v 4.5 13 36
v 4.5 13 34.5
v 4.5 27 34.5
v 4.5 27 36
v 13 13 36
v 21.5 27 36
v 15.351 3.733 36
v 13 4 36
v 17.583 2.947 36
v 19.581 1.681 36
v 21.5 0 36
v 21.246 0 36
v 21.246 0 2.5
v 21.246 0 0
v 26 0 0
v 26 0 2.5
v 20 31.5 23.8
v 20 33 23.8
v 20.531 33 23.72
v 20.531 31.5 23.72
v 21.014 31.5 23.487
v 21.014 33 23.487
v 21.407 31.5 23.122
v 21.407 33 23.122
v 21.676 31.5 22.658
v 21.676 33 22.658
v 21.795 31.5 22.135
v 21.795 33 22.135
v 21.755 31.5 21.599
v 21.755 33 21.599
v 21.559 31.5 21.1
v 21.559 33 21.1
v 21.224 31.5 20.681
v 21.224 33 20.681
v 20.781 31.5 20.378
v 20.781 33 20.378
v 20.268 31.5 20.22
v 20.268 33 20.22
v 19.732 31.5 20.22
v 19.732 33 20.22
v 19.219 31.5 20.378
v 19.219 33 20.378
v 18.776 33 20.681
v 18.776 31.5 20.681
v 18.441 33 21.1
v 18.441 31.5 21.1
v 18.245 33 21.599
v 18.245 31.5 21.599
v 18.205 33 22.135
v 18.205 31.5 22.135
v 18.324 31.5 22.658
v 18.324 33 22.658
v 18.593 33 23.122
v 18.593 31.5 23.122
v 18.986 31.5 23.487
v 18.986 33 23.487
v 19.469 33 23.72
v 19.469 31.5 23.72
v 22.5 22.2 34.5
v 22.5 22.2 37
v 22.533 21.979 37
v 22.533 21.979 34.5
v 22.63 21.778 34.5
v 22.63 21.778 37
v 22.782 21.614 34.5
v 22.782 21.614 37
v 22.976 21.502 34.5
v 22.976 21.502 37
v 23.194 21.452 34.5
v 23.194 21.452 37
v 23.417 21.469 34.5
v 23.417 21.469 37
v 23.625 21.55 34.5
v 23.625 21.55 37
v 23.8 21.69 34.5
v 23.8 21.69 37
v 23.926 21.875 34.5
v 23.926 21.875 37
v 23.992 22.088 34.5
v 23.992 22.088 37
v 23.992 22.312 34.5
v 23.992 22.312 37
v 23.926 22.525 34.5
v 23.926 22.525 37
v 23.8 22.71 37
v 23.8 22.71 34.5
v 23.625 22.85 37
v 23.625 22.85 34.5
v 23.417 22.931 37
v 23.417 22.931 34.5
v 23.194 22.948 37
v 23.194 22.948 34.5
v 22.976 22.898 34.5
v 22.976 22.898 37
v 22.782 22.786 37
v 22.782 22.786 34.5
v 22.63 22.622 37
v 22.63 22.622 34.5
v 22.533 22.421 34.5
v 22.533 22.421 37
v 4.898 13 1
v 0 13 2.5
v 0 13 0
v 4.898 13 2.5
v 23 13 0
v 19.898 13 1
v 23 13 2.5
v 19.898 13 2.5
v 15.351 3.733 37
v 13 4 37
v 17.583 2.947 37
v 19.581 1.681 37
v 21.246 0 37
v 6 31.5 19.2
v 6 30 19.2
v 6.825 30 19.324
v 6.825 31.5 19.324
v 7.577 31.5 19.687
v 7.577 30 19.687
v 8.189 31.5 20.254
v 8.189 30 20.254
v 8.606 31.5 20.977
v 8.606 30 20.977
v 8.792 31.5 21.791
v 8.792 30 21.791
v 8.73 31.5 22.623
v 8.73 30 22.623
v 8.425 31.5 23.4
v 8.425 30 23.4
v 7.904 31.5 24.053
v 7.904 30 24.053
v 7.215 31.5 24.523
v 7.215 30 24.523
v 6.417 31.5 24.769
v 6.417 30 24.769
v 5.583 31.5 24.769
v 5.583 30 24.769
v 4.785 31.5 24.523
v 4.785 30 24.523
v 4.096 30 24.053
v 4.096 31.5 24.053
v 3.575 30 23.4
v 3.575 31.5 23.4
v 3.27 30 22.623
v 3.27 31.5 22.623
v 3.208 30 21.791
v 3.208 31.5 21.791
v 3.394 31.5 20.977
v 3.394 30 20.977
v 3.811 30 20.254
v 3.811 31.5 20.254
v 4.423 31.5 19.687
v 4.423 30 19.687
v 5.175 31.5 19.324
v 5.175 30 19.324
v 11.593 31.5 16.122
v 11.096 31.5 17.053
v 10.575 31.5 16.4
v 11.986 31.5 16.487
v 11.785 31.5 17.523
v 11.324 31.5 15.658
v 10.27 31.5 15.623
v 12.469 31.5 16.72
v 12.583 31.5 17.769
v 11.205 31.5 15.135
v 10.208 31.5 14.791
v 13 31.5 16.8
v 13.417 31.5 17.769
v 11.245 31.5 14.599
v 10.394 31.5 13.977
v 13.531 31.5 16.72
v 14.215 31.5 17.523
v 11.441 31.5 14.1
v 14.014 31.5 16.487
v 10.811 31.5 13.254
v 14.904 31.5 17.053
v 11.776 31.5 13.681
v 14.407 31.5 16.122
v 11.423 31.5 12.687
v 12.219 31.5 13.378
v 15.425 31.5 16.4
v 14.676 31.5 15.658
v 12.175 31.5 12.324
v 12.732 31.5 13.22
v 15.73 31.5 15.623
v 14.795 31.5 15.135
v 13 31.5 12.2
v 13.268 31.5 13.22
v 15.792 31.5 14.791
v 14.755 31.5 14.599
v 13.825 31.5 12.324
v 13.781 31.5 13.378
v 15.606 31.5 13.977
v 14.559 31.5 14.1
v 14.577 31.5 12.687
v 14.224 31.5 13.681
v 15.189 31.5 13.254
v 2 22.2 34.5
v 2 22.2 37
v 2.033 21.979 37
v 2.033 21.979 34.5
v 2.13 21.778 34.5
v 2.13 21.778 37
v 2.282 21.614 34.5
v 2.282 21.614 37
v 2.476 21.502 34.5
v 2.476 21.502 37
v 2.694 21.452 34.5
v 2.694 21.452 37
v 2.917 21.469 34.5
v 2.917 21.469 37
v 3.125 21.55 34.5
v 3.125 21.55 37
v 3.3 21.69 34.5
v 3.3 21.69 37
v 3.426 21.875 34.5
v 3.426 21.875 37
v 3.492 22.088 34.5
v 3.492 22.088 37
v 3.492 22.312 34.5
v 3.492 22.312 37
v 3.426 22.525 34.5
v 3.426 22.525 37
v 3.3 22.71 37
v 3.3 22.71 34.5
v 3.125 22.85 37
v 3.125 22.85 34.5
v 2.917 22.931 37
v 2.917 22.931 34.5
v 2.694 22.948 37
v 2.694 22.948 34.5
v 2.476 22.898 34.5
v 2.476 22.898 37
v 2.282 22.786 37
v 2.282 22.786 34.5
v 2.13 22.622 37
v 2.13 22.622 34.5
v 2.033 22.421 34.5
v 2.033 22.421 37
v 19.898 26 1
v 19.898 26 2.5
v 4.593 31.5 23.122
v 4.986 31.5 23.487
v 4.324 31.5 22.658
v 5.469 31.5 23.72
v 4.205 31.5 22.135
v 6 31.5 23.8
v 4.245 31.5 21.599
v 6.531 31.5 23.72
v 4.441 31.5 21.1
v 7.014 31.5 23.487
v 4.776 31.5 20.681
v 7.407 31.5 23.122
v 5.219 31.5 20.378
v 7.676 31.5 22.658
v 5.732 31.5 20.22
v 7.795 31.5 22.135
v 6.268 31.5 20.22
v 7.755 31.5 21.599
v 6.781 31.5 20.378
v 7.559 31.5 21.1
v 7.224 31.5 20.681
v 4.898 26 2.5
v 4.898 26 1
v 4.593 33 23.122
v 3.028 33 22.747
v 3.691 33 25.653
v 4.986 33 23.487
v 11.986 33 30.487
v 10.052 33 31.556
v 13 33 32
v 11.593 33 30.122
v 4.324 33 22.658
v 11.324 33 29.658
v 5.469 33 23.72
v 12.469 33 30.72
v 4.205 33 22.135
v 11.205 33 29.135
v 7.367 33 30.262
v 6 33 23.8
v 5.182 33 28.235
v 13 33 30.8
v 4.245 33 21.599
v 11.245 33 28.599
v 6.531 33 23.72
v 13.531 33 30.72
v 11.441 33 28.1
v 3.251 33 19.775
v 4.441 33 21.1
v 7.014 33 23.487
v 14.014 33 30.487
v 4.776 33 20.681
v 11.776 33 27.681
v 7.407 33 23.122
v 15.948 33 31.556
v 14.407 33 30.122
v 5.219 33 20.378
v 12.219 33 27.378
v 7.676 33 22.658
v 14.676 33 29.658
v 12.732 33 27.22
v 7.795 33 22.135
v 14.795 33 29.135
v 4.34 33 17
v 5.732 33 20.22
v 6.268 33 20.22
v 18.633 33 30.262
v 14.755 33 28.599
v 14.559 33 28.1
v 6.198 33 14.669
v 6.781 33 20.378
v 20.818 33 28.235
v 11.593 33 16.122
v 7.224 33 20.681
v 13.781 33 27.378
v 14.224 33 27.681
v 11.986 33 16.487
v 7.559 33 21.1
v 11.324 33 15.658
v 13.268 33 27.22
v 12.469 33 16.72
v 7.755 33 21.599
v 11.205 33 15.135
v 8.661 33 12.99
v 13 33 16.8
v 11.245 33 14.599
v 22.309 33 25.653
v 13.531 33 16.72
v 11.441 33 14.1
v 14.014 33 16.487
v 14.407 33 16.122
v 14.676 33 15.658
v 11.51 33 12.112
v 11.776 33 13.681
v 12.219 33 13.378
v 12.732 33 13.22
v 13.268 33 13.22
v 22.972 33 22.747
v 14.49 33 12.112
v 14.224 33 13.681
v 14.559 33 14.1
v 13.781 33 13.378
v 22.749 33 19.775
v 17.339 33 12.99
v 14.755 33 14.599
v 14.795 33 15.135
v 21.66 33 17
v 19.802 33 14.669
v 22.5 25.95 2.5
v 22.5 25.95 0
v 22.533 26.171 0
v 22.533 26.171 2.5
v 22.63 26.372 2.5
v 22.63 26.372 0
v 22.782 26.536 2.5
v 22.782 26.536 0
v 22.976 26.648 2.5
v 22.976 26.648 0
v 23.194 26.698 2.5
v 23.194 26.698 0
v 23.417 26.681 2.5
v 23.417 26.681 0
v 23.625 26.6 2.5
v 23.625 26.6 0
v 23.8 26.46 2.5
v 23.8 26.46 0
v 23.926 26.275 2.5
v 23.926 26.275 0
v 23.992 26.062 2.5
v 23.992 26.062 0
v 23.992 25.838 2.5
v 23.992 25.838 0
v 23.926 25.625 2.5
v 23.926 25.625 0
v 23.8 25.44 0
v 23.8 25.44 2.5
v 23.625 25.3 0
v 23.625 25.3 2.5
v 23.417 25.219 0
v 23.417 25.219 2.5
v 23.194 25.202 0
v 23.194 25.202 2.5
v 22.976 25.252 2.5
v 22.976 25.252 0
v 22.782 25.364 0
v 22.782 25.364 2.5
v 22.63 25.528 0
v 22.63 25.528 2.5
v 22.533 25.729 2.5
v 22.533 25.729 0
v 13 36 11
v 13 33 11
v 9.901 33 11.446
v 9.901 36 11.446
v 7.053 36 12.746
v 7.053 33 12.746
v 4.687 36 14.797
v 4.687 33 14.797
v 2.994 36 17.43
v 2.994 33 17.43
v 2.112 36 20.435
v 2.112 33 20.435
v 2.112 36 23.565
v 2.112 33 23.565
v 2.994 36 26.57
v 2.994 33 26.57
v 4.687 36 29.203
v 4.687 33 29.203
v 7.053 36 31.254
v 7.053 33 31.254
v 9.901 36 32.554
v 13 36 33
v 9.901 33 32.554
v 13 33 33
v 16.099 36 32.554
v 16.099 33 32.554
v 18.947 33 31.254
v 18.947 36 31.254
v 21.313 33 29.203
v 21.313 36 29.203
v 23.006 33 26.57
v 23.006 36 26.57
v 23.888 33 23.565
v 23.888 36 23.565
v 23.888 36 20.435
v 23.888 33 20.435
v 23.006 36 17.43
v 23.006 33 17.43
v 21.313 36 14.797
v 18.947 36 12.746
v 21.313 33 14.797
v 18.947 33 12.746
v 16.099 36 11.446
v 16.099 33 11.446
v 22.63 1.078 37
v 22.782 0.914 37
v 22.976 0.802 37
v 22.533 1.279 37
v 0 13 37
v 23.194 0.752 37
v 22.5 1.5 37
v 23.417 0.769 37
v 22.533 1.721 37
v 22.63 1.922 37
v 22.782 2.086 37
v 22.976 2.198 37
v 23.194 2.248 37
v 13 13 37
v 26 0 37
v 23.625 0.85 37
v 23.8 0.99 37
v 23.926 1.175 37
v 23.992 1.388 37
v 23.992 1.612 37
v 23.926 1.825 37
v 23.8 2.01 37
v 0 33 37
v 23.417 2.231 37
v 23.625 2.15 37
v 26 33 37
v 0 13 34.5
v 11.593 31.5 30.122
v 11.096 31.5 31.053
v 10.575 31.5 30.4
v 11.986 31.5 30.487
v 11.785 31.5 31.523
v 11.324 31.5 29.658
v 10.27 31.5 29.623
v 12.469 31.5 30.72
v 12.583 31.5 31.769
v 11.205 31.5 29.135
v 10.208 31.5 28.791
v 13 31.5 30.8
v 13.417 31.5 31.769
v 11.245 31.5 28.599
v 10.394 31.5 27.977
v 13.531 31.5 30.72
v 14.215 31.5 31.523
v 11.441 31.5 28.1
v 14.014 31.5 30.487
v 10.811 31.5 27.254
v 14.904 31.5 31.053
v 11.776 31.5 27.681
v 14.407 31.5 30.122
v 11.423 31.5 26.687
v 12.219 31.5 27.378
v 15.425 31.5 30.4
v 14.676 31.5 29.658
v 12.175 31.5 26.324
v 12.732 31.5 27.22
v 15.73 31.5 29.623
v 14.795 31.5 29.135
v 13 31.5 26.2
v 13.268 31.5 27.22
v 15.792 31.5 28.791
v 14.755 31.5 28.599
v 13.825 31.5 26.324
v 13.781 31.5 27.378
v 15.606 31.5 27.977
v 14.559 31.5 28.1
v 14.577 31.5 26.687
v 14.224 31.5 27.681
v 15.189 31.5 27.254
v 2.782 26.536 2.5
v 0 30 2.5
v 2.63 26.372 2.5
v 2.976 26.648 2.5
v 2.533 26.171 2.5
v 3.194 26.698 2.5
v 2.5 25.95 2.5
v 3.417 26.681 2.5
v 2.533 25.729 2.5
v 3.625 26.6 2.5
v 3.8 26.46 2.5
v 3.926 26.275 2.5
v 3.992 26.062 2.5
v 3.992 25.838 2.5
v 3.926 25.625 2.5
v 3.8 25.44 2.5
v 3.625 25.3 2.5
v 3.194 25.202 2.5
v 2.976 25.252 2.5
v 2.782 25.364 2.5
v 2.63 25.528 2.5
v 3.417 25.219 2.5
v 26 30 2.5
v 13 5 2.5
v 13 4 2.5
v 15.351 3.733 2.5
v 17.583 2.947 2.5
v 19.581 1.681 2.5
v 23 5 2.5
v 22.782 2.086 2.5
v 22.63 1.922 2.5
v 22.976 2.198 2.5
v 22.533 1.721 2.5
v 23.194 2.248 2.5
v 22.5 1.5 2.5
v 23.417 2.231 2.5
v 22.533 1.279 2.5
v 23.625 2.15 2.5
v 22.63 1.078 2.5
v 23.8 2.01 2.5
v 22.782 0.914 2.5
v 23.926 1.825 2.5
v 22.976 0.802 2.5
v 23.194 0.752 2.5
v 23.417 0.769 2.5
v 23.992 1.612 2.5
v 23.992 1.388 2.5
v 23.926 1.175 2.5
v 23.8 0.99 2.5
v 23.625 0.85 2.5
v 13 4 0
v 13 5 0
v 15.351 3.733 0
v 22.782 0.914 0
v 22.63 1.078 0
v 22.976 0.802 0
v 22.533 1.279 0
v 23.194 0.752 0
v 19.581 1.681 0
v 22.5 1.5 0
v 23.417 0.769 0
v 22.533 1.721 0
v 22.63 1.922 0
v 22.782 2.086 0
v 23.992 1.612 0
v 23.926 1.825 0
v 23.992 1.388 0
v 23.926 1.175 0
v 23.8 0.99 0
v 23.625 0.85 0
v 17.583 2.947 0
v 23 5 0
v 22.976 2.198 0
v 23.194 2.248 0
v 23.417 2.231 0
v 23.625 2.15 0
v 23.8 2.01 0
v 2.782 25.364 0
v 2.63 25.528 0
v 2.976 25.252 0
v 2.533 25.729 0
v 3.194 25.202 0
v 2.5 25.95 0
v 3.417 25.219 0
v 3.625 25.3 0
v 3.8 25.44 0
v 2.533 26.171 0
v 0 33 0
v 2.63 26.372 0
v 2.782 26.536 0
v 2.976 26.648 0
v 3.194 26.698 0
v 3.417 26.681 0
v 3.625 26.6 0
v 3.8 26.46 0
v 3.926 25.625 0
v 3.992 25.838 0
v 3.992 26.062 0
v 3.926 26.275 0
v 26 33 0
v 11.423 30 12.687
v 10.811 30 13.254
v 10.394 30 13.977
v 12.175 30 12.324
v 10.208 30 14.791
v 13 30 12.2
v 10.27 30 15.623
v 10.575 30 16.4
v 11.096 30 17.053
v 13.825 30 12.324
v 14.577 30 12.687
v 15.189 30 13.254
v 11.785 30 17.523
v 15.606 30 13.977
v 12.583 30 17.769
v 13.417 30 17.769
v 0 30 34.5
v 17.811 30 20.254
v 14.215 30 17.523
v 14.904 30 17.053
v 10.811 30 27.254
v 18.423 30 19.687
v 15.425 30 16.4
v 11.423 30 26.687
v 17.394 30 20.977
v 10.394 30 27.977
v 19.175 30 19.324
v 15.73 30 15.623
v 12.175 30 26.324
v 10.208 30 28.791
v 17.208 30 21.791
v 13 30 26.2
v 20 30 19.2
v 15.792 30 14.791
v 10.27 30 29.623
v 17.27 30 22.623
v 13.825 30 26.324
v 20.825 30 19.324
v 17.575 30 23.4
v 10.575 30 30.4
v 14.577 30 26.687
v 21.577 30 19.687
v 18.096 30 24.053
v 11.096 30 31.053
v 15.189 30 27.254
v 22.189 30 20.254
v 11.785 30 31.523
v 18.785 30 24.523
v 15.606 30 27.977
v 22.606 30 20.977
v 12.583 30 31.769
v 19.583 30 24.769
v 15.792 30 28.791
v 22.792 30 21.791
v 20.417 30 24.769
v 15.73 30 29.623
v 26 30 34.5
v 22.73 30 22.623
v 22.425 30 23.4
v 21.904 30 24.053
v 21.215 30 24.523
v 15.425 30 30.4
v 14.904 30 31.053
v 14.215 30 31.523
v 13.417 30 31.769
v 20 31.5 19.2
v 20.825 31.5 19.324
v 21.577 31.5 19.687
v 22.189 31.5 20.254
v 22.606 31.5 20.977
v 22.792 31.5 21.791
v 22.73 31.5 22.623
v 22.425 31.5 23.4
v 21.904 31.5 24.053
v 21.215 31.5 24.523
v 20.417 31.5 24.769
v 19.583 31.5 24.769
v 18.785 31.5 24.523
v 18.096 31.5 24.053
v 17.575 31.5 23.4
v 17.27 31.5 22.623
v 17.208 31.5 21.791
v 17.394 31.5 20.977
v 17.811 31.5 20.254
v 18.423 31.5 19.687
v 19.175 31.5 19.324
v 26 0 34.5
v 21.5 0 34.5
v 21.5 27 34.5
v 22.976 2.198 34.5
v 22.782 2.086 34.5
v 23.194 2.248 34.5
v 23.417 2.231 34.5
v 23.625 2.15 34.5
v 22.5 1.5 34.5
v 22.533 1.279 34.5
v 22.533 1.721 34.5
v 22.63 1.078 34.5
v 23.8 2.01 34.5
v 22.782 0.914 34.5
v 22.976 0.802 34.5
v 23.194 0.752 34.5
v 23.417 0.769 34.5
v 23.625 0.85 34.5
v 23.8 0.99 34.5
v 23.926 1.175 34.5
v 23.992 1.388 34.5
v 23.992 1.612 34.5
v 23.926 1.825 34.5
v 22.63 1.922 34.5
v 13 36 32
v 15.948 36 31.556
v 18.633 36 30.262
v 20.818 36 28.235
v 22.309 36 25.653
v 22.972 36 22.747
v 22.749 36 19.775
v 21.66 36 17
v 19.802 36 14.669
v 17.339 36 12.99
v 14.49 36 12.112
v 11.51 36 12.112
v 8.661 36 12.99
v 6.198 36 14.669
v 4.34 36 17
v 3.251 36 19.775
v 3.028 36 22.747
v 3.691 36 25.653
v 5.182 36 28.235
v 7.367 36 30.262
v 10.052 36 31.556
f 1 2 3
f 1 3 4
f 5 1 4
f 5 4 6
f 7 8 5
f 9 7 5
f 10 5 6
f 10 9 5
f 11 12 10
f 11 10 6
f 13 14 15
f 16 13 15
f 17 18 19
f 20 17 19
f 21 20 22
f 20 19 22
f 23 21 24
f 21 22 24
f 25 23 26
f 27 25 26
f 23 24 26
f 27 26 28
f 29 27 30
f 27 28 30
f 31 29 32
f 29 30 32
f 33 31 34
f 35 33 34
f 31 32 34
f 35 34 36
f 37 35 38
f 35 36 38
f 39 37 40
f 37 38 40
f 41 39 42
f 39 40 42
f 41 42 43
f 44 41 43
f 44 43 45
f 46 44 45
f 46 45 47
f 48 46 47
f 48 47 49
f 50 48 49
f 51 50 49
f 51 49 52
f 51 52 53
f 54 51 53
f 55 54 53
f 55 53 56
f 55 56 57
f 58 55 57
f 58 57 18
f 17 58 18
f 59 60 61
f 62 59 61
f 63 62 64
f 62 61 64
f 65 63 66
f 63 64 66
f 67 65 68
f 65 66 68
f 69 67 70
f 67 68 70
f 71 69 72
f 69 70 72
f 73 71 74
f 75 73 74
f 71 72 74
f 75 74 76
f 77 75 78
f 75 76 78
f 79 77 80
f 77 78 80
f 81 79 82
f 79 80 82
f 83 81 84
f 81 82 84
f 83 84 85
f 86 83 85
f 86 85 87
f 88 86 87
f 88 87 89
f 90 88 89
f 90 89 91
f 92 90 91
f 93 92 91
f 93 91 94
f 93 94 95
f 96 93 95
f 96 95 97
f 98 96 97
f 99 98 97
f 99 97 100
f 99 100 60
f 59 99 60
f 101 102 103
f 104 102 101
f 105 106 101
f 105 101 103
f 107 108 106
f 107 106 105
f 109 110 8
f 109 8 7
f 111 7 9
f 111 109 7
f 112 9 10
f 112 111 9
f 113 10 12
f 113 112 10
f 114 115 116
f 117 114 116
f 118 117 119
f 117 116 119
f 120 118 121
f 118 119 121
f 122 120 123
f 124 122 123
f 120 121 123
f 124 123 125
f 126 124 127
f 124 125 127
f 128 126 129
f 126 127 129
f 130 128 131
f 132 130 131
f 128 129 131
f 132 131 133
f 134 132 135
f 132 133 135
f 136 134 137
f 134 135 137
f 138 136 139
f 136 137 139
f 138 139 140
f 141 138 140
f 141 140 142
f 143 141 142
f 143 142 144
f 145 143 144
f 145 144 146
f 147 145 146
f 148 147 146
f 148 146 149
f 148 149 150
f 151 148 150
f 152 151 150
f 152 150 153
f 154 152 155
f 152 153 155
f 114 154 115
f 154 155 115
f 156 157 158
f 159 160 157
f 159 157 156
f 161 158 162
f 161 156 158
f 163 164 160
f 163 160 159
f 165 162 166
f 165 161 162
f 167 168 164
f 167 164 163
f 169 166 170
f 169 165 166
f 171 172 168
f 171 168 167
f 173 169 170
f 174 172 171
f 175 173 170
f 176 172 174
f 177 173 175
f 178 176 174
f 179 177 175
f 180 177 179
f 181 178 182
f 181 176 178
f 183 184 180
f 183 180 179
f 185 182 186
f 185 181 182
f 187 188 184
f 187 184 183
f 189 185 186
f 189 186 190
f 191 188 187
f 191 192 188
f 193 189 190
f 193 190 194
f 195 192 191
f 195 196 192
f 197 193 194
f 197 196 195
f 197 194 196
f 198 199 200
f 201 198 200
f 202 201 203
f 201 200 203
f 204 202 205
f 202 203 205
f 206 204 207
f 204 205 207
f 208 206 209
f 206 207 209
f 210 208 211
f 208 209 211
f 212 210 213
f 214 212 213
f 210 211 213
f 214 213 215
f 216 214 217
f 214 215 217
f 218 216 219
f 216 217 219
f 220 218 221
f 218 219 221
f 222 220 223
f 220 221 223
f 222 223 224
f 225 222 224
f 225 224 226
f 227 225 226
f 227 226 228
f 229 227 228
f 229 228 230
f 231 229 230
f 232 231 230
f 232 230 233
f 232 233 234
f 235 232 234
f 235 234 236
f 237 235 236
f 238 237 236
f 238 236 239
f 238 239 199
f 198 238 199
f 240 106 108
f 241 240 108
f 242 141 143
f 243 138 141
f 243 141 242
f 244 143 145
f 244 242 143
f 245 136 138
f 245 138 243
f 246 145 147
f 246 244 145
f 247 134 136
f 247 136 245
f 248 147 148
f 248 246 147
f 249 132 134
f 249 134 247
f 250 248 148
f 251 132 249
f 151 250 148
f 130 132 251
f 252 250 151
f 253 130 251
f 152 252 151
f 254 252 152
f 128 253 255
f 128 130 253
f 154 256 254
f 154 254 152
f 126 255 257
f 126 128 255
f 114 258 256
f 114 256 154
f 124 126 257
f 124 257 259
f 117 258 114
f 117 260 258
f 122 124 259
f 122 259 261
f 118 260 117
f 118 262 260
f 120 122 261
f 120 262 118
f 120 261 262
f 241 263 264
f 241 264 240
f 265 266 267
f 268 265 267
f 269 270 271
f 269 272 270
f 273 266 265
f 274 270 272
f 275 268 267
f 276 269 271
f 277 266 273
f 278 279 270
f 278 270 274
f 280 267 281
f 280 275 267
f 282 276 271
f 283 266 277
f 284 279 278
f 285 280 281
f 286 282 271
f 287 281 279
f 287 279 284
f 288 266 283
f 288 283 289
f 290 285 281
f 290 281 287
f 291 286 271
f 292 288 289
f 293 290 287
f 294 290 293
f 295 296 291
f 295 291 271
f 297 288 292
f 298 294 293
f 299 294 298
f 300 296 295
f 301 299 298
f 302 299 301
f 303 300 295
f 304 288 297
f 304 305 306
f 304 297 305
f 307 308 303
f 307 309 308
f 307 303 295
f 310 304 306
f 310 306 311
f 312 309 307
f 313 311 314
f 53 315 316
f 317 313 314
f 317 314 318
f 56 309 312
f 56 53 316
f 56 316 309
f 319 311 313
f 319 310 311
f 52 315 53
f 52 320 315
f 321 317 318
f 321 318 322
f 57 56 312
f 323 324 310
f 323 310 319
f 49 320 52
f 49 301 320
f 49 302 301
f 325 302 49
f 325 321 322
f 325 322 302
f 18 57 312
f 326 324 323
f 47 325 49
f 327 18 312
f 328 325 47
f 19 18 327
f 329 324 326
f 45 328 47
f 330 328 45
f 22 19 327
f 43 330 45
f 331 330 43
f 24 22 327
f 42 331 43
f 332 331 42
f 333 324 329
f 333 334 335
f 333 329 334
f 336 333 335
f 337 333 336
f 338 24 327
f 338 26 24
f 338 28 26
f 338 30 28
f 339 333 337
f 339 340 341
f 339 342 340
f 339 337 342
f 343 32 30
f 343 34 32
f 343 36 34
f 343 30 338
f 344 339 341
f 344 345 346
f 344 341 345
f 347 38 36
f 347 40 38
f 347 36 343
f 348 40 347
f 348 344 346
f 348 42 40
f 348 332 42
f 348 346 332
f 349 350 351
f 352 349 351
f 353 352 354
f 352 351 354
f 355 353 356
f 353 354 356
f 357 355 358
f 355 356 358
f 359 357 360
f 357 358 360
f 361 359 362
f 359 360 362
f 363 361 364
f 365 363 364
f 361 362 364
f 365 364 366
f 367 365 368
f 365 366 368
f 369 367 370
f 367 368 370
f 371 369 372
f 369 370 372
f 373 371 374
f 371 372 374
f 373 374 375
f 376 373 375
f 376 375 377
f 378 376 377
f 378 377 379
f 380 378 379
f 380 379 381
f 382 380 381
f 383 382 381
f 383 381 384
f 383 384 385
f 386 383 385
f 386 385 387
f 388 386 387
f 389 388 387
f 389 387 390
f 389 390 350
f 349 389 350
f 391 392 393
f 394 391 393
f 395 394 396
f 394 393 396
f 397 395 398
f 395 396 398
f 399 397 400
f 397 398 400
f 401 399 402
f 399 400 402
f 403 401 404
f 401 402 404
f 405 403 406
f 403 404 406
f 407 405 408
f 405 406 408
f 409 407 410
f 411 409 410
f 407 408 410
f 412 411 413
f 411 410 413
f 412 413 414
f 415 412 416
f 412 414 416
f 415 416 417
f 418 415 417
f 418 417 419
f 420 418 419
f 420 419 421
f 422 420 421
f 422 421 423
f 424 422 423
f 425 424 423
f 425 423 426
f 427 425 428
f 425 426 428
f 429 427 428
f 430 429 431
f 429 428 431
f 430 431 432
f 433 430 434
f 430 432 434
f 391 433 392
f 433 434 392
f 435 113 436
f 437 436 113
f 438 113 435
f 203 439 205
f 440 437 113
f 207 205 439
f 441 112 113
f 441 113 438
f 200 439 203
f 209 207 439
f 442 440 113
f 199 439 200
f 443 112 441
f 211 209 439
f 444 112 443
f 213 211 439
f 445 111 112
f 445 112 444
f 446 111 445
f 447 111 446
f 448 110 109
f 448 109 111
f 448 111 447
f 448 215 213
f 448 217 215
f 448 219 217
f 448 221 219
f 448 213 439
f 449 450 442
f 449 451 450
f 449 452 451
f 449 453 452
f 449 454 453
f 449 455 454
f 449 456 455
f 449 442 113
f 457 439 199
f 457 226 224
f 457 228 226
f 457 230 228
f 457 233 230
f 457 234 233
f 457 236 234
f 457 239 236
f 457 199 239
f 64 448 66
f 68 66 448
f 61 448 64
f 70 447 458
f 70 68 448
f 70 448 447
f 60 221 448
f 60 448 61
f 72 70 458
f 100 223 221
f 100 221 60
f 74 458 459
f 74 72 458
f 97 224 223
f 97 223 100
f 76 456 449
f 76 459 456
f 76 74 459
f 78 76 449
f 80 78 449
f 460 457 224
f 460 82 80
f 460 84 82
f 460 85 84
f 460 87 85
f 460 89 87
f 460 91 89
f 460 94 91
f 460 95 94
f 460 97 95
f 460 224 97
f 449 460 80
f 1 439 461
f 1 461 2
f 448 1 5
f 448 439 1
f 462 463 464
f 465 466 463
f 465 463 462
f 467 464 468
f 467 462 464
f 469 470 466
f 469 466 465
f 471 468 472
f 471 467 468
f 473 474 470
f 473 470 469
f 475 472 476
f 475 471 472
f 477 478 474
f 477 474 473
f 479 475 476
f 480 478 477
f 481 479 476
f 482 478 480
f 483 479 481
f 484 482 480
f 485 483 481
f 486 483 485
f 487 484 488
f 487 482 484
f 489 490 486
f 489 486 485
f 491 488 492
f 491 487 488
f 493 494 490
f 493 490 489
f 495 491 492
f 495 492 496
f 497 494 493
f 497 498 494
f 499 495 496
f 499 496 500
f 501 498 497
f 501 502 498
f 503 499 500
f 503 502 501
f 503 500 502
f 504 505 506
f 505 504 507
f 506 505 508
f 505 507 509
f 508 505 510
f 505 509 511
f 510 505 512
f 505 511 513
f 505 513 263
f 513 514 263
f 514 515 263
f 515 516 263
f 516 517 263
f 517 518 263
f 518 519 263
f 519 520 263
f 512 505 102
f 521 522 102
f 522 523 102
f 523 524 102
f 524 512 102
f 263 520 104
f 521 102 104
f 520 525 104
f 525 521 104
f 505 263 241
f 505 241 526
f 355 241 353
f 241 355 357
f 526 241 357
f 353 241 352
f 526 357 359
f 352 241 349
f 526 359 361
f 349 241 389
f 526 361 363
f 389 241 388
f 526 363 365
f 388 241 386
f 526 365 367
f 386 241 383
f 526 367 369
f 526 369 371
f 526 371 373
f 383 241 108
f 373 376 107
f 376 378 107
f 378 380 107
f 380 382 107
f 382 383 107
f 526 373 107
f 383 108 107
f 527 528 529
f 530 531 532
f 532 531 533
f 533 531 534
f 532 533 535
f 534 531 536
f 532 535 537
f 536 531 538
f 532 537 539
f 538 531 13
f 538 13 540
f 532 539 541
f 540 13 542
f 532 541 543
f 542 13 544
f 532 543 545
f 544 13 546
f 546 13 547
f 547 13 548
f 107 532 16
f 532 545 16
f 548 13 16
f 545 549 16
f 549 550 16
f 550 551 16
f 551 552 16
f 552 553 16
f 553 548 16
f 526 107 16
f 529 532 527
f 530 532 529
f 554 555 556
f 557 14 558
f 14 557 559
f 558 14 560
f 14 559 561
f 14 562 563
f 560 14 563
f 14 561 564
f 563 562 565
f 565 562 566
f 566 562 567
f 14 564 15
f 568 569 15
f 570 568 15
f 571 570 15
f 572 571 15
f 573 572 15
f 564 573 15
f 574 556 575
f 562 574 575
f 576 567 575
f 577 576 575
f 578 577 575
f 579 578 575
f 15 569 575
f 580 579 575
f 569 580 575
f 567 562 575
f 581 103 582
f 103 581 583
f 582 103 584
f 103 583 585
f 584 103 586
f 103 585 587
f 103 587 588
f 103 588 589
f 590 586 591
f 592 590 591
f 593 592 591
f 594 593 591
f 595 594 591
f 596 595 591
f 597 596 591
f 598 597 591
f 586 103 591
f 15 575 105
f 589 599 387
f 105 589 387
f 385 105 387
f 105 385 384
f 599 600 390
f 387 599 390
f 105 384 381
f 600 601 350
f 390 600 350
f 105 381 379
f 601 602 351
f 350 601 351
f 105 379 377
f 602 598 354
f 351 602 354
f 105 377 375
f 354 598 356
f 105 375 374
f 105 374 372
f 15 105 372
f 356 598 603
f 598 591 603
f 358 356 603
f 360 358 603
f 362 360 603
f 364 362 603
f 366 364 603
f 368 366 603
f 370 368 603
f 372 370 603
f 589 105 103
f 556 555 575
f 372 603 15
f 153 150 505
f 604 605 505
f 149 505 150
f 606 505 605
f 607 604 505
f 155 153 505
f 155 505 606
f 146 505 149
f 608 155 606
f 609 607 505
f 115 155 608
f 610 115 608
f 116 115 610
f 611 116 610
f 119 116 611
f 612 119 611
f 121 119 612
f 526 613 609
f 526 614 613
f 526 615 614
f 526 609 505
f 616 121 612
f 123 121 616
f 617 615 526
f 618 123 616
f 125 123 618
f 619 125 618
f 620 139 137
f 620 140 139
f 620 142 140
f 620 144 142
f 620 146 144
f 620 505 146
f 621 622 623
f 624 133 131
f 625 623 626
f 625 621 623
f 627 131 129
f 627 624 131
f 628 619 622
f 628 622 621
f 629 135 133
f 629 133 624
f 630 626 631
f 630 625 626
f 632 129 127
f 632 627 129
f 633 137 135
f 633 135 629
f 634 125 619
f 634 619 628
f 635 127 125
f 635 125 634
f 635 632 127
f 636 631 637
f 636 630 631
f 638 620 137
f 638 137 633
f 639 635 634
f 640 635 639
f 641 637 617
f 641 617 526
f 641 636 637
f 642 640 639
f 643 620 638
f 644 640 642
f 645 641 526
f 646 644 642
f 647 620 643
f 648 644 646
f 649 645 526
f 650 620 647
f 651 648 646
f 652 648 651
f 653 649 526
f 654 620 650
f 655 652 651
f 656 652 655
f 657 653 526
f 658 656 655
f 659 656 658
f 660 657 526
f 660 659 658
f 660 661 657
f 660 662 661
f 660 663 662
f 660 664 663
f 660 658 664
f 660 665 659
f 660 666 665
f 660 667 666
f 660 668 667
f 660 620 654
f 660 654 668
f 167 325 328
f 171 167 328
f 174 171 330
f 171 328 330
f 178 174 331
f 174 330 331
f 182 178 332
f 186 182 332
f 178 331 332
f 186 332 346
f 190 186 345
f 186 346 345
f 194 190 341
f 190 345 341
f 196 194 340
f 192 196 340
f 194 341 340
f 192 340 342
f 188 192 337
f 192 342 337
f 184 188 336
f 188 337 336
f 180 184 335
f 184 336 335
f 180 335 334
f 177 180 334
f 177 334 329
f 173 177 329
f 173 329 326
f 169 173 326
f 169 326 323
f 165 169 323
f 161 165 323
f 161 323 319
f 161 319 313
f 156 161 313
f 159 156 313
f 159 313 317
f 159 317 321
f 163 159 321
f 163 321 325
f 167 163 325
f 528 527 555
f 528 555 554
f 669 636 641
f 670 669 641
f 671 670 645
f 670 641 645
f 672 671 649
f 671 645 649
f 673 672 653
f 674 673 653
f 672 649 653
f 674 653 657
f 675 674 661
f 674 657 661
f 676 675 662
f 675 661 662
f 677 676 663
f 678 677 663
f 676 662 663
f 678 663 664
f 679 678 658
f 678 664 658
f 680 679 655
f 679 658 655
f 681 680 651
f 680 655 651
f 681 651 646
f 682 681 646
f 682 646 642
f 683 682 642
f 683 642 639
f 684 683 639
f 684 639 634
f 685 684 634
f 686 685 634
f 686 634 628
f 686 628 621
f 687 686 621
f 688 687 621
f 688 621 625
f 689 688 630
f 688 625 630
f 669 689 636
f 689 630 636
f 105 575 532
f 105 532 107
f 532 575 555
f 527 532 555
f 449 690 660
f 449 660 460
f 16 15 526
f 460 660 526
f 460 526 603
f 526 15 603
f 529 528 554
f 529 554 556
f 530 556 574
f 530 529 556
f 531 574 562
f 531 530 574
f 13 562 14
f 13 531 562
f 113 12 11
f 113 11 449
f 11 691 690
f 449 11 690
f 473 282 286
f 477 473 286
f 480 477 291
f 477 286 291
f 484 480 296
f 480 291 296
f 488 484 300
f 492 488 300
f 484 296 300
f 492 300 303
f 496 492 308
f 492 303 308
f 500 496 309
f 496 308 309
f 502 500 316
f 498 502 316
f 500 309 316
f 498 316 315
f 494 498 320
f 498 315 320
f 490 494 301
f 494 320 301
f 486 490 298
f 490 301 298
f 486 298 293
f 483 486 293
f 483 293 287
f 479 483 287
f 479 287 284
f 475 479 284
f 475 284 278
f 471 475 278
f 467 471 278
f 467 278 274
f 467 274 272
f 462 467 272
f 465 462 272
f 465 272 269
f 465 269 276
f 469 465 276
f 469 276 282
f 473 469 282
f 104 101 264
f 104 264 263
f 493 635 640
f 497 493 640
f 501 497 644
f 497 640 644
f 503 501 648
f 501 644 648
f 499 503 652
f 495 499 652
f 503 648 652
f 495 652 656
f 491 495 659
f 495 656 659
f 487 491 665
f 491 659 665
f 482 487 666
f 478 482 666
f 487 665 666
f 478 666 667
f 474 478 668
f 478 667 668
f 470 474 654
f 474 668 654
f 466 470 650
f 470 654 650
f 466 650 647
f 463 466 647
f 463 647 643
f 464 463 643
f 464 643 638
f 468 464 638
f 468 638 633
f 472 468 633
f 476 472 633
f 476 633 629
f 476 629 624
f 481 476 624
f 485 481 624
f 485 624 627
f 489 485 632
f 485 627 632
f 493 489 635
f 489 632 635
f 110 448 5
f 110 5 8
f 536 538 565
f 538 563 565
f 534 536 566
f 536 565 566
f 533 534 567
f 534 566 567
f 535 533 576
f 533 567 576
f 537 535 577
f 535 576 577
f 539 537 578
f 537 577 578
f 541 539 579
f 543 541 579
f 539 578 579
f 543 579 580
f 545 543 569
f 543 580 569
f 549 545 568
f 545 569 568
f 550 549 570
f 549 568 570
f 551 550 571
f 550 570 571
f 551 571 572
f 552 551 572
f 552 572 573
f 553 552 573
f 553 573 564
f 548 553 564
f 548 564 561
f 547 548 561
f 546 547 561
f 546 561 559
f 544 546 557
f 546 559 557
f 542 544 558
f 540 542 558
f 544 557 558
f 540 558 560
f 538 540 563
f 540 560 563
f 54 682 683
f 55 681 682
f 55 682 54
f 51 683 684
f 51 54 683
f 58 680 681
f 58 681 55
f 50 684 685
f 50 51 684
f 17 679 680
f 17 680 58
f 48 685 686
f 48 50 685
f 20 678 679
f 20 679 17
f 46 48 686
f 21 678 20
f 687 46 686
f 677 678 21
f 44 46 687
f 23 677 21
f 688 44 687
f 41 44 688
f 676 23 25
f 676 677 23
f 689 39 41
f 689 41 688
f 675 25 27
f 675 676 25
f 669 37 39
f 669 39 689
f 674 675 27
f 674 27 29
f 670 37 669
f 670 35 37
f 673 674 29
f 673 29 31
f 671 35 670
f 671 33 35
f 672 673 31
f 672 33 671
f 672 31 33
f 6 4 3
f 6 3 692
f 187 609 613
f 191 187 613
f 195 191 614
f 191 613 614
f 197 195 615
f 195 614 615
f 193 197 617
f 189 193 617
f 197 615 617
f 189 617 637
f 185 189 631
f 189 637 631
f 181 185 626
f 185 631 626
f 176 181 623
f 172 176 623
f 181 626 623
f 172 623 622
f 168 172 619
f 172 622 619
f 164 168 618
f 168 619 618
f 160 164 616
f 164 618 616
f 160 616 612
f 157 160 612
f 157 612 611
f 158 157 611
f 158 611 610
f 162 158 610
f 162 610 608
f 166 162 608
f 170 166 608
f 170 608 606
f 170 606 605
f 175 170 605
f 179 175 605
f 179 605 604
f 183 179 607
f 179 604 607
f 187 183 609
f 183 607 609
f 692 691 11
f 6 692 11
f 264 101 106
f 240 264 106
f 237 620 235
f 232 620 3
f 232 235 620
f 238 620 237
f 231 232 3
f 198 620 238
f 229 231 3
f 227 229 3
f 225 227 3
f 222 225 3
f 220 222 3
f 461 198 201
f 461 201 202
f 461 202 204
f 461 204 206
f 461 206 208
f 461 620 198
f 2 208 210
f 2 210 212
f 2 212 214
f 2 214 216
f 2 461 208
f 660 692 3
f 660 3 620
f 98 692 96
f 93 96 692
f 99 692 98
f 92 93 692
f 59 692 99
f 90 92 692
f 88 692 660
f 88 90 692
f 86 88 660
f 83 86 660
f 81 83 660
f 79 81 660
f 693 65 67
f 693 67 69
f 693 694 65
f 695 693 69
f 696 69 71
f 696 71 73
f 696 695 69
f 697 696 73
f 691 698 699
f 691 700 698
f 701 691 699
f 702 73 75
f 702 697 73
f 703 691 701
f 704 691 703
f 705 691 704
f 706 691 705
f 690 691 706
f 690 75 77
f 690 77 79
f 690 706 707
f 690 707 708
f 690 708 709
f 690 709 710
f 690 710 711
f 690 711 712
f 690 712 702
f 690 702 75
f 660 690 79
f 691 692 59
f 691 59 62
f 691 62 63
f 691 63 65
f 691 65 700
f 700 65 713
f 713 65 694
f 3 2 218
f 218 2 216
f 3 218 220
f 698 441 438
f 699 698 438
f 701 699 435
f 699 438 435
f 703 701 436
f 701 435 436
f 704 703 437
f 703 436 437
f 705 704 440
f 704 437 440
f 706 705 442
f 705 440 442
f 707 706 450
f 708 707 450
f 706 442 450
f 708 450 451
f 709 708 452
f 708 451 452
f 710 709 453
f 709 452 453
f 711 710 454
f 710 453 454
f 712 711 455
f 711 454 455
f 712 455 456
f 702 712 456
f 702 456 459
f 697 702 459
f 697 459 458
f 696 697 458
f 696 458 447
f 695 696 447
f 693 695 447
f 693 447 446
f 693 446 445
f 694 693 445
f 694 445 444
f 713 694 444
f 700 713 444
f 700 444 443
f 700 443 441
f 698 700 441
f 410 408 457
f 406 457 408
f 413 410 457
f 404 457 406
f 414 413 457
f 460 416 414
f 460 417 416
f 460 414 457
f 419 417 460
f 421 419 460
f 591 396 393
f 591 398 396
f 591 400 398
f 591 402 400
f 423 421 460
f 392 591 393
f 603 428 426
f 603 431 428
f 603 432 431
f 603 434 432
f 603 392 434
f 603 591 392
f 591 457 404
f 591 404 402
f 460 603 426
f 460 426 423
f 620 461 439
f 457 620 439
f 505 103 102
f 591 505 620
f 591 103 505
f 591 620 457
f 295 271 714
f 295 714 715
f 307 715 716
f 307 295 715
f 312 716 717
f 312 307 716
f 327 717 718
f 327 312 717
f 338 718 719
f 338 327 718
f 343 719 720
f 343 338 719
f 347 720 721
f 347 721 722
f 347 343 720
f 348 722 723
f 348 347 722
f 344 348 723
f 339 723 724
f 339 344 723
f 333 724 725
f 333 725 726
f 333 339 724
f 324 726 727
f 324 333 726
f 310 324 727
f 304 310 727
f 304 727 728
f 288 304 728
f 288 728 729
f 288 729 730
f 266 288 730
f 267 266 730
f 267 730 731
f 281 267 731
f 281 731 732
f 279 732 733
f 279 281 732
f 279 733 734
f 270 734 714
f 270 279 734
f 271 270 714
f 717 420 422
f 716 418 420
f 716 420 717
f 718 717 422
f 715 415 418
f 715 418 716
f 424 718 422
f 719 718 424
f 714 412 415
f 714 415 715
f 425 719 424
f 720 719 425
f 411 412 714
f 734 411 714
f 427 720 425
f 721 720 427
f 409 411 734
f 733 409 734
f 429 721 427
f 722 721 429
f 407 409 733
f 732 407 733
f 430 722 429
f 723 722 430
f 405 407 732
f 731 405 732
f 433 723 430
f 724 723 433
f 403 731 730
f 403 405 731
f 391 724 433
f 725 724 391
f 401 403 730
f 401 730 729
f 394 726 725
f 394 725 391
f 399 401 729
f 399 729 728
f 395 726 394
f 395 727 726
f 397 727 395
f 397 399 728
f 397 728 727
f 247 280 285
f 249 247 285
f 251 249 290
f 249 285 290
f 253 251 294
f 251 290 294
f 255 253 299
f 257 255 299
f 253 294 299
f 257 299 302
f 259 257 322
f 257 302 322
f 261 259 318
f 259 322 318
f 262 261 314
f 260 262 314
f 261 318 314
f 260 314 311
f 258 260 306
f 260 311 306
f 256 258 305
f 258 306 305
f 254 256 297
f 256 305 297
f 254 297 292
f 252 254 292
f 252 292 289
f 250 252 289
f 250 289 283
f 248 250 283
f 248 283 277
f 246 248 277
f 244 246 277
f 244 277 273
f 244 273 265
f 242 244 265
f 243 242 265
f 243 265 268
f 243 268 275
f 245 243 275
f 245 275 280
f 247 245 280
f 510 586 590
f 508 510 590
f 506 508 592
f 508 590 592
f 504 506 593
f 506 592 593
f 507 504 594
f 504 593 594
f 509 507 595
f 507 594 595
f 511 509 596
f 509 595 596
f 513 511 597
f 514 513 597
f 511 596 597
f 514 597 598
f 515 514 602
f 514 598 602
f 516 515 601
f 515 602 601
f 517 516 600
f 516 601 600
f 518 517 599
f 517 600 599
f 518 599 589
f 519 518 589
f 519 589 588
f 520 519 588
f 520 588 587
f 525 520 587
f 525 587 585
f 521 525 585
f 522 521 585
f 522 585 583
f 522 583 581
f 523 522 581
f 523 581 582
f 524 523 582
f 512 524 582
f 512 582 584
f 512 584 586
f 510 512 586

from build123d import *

# Parameters (mm, degrees)
SKETCH_1_W                      = 26
SKETCH_1_H                      = 33
EXTRUDE_1_DEPTH                 = 37
SKETCH_3_W                      = 26
SKETCH_3_H                      = 32
CUT_EXTRUDE_1_DEPTH             = 30
CUT_EXTRUDE_2_REACH             = 57.982
SKETCH_2_R                      = 0.75
CUT_EXTRUDE_2_DIRECTION_2_DEPTH = 56.982140009
CUT_EXTRUDE_3_REACH             = 57.982
SKETCH_4_R                      = 0.75
SKETCH_5_W                      = 17
SKETCH_5_H                      = 1.5
CUT_EXTRUDE_4_DEPTH             = 27
CUT_EXTRUDE_5_REACH             = 57.982
SKETCH_6_W                      = 20
SKETCH_6_H                      = 8
CUT_EXTRUDE_START               = -37
CUT_EXTRUDE_6_OUTLINE_R         = 0.75
CUT_EXTRUDE_6_DEPTH             = 37
SKETCH_8_W                      = 15
SKETCH_8_H                      = 1.5
CUT_EXTRUDE_7_DEPTH             = 13
SKETCH_9_R                      = 11
SKETCH_9_R_2                    = 10
EXTRUDE_2_DEPTH                 = 3
CUT_EXTRUDE_8_REACH             = 57.982
SKETCH_10_R                     = 1.8
SKETCH_11_R                     = 2.8
CUT_EXTRUDE_9_DEPTH             = 1.5


# Read off the part's stored shape, not the designer's step: 切除-拉伸6
with BuildPart() as part:
    # 草图1 → 凸台-拉伸1 (new body)
    with BuildSketch(Plane.XY):
        with Locations((13, 16.5)):
            Rectangle(SKETCH_1_W, SKETCH_1_H)
    extrude(amount=EXTRUDE_1_DEPTH)

    # 草图3 → 切除-拉伸1 (cut)
    with BuildSketch(Plane.XZ):
        with Locations((13, 18.5)):
            Rectangle(SKETCH_3_W, SKETCH_3_H)
    extrude(amount=-CUT_EXTRUDE_1_DEPTH, mode=Mode.SUBTRACT)

    # 草图2 → 切除-拉伸2 (cut, up to next)
    with BuildSketch(Plane.XY.offset(37), mode=Mode.PRIVATE) as cut_extrude_2_sk1:
        with Locations(Location((2.75, 1.5, 0), (0, 0, 180))):
            Circle(SKETCH_2_R)
    cut_extrude_2_tool1 = extrude(cut_extrude_2_sk1.sketch, amount=-CUT_EXTRUDE_2_REACH, mode=Mode.PRIVATE) & part.part
    # 草图2 → 切除-拉伸2 (cut, up to next)
    with BuildSketch(Plane.XY.offset(37), mode=Mode.PRIVATE) as cut_extrude_2_sk2:
        with Locations(Location((23.25, 1.5, 0), (0, 0, 180))):
            Circle(SKETCH_2_R)
    cut_extrude_2_tool2 = extrude(cut_extrude_2_sk2.sketch, amount=-CUT_EXTRUDE_2_REACH, mode=Mode.PRIVATE) & part.part
    # 草图2 → 切除-拉伸2 (cut, up to next)
    with BuildSketch(Plane.XY.offset(37), mode=Mode.PRIVATE) as cut_extrude_2_sk3:
        with Locations(Location((23.25, 22.2, 0), (0, 0, 180))):
            Circle(SKETCH_2_R)
    cut_extrude_2_tool3 = extrude(cut_extrude_2_sk3.sketch, amount=-CUT_EXTRUDE_2_REACH, mode=Mode.PRIVATE) & part.part
    # 草图2 → 切除-拉伸2 (cut, up to next)
    with BuildSketch(Plane.XY.offset(37), mode=Mode.PRIVATE) as cut_extrude_2_sk4:
        with Locations(Location((2.75, 22.2, 0), (0, 0, 180))):
            Circle(SKETCH_2_R)
    cut_extrude_2_tool4 = extrude(cut_extrude_2_sk4.sketch, amount=-CUT_EXTRUDE_2_REACH, mode=Mode.PRIVATE) & part.part
    add(cut_extrude_2_tool1.solids().sort_by_distance((2.75, 1.5, 37))[0], mode=Mode.SUBTRACT)
    add(cut_extrude_2_tool2.solids().sort_by_distance((23.25, 1.5, 37))[0], mode=Mode.SUBTRACT)
    add(cut_extrude_2_tool3.solids().sort_by_distance((23.25, 22.2, 37))[0], mode=Mode.SUBTRACT)
    add(cut_extrude_2_tool4.solids().sort_by_distance((2.75, 22.2, 37))[0], mode=Mode.SUBTRACT)

    # 草图2 → 切除-拉伸2 direction 2 (cut)
    with BuildSketch(Plane.XY.offset(37)):
        with Locations(Location((2.75, 1.5, 0), (0, 0, 180))):
            Circle(SKETCH_2_R)
        with Locations(Location((23.25, 1.5, 0), (0, 0, 180))):
            Circle(SKETCH_2_R)
        with Locations(Location((23.25, 22.2, 0), (0, 0, 180))):
            Circle(SKETCH_2_R)
        with Locations(Location((2.75, 22.2, 0), (0, 0, 180))):
            Circle(SKETCH_2_R)
    extrude(amount=CUT_EXTRUDE_2_DIRECTION_2_DEPTH, mode=Mode.SUBTRACT)

    # 草图4 → 切除-拉伸3 (cut, up to next)
    with BuildSketch(Plane(origin=(0, 0, 0), x_dir=(-1, 0, 0), z_dir=(0, 0, -1)), mode=Mode.PRIVATE) as cut_extrude_3_sk1:
        with Locations((-2.75, 1.5)):
            Circle(SKETCH_4_R)
    cut_extrude_3_tool1 = extrude(cut_extrude_3_sk1.sketch, amount=-CUT_EXTRUDE_3_REACH, mode=Mode.PRIVATE) & part.part
    # 草图4 → 切除-拉伸3 (cut, up to next)
    with BuildSketch(Plane(origin=(0, 0, 0), x_dir=(-1, 0, 0), z_dir=(0, 0, -1)), mode=Mode.PRIVATE) as cut_extrude_3_sk2:
        with Locations((-23.25, 1.5)):
            Circle(SKETCH_4_R)
    cut_extrude_3_tool2 = extrude(cut_extrude_3_sk2.sketch, amount=-CUT_EXTRUDE_3_REACH, mode=Mode.PRIVATE) & part.part
    # 草图4 → 切除-拉伸3 (cut, up to next)
    with BuildSketch(Plane(origin=(0, 0, 0), x_dir=(-1, 0, 0), z_dir=(0, 0, -1)), mode=Mode.PRIVATE) as cut_extrude_3_sk3:
        with Locations((-23.25, 25.95)):
            Circle(SKETCH_4_R)
    cut_extrude_3_tool3 = extrude(cut_extrude_3_sk3.sketch, amount=-CUT_EXTRUDE_3_REACH, mode=Mode.PRIVATE) & part.part
    # 草图4 → 切除-拉伸3 (cut, up to next)
    with BuildSketch(Plane(origin=(0, 0, 0), x_dir=(-1, 0, 0), z_dir=(0, 0, -1)), mode=Mode.PRIVATE) as cut_extrude_3_sk4:
        with Locations((-3.25, 25.95)):
            Circle(SKETCH_4_R)
    cut_extrude_3_tool4 = extrude(cut_extrude_3_sk4.sketch, amount=-CUT_EXTRUDE_3_REACH, mode=Mode.PRIVATE) & part.part
    add(cut_extrude_3_tool1.solids().sort_by_distance((2.75, 1.5, 0))[0], mode=Mode.SUBTRACT)
    add(cut_extrude_3_tool2.solids().sort_by_distance((23.25, 1.5, 0))[0], mode=Mode.SUBTRACT)
    add(cut_extrude_3_tool3.solids().sort_by_distance((23.25, 25.95, 0))[0], mode=Mode.SUBTRACT)
    add(cut_extrude_3_tool4.solids().sort_by_distance((3.25, 25.95, 0))[0], mode=Mode.SUBTRACT)

    # 草图5 → 切除-拉伸4 (cut)
    with BuildSketch(Plane.XZ):
        with Locations((13, 35.25)):
            Rectangle(SKETCH_5_W, SKETCH_5_H)
    extrude(amount=-CUT_EXTRUDE_4_DEPTH, mode=Mode.SUBTRACT)

    # 草图6 → 切除-拉伸5 (cut, up to next)
    with BuildSketch(Plane(origin=(0, 0, 0), x_dir=(-1, 0, 0), z_dir=(0, 0, -1)), mode=Mode.PRIVATE) as cut_extrude_5_sk1:
        with Locations((-13, 9)):
            Rectangle(SKETCH_6_W, SKETCH_6_H)
    cut_extrude_5_tool1 = extrude(cut_extrude_5_sk1.sketch, amount=-CUT_EXTRUDE_5_REACH, mode=Mode.PRIVATE) & part.part
    add(cut_extrude_5_tool1.solids().sort_by_distance((13, 9, 0))[0], mode=Mode.SUBTRACT)

    # 切除-拉伸6 outline → 切除-拉伸6 (cut)
    with BuildSketch(Plane(origin=(0, 0, 0), x_dir=(-1, 0, 0), z_dir=(0, 0, -1)).offset(CUT_EXTRUDE_START)):
        with BuildLine():
            Line((0, 0), (0, 13))
            Line((0, 13), (-13, 13))
            Line((-13, 13), (-13, 4))
            ThreePointArc((-13, 4), (-17.582575695, 2.947221814), (-21.246211251, 0))
            Line((-21.246211251, 0), (0, 0))
        make_face()
        with Locations((-2.75, 1.5)):
            Circle(CUT_EXTRUDE_6_OUTLINE_R, mode=Mode.SUBTRACT)
    extrude(amount=CUT_EXTRUDE_6_DEPTH, mode=Mode.SUBTRACT)

    # 草图8 → 切除-拉伸7 (cut)
    with BuildSketch(Plane.XZ.offset(-13)):
        with Locations((12.397702636, 1.75)):
            Rectangle(SKETCH_8_W, SKETCH_8_H)
    extrude(amount=-CUT_EXTRUDE_7_DEPTH, mode=Mode.SUBTRACT)

    # 草图9 → 凸台-拉伸2 (add)
    with BuildSketch(Plane(origin=(0, 33, 0), x_dir=(1, 0, 0), z_dir=(0, 1, 0))):
        with Locations(Location((13, -22, 0), (0, 0, 90))):
            Circle(SKETCH_9_R)
        with Locations(Location((13, -22, 0), (0, 0, 270))):
            Circle(SKETCH_9_R_2, mode=Mode.SUBTRACT)
    extrude(amount=EXTRUDE_2_DEPTH)

    # 草图10 → 切除-拉伸8 (cut, up to next)
    with BuildSketch(Plane(origin=(0, 33, 0), x_dir=(1, 0, 0), z_dir=(0, 1, 0)), mode=Mode.PRIVATE) as cut_extrude_8_sk1:
        with Locations(Location((13, -15, 0), (0, 0, 270))):
            Circle(SKETCH_10_R)
    cut_extrude_8_tool1 = extrude(cut_extrude_8_sk1.sketch, amount=-CUT_EXTRUDE_8_REACH, mode=Mode.PRIVATE) & part.part
    # 草图10 → 切除-拉伸8 (cut, up to next)
    with BuildSketch(Plane(origin=(0, 33, 0), x_dir=(1, 0, 0), z_dir=(0, 1, 0)), mode=Mode.PRIVATE) as cut_extrude_8_sk2:
        with Locations(Location((20, -22, 0), (0, 0, 270))):
            Circle(SKETCH_10_R)
    cut_extrude_8_tool2 = extrude(cut_extrude_8_sk2.sketch, amount=-CUT_EXTRUDE_8_REACH, mode=Mode.PRIVATE) & part.part
    # 草图10 → 切除-拉伸8 (cut, up to next)
    with BuildSketch(Plane(origin=(0, 33, 0), x_dir=(1, 0, 0), z_dir=(0, 1, 0)), mode=Mode.PRIVATE) as cut_extrude_8_sk3:
        with Locations(Location((13, -29, 0), (0, 0, 270))):
            Circle(SKETCH_10_R)
    cut_extrude_8_tool3 = extrude(cut_extrude_8_sk3.sketch, amount=-CUT_EXTRUDE_8_REACH, mode=Mode.PRIVATE) & part.part
    # 草图10 → 切除-拉伸8 (cut, up to next)
    with BuildSketch(Plane(origin=(0, 33, 0), x_dir=(1, 0, 0), z_dir=(0, 1, 0)), mode=Mode.PRIVATE) as cut_extrude_8_sk4:
        with Locations(Location((6, -22, 0), (0, 0, 270))):
            Circle(SKETCH_10_R)
    cut_extrude_8_tool4 = extrude(cut_extrude_8_sk4.sketch, amount=-CUT_EXTRUDE_8_REACH, mode=Mode.PRIVATE) & part.part
    add(cut_extrude_8_tool1.solids().sort_by_distance((13, 33, 15))[0], mode=Mode.SUBTRACT)
    add(cut_extrude_8_tool2.solids().sort_by_distance((20, 33, 22))[0], mode=Mode.SUBTRACT)
    add(cut_extrude_8_tool3.solids().sort_by_distance((13, 33, 29))[0], mode=Mode.SUBTRACT)
    add(cut_extrude_8_tool4.solids().sort_by_distance((6, 33, 22))[0], mode=Mode.SUBTRACT)

    # 草图11 → 切除-拉伸9 (cut)
    with BuildSketch(Plane.XZ.offset(-30)):
        with Locations(Location((6, 22, 0), (0, 0, 270))):
            Circle(SKETCH_11_R)
        with Locations(Location((13, 29, 0), (0, 0, 270))):
            Circle(SKETCH_11_R)
        with Locations(Location((20, 22, 0), (0, 0, 270))):
            Circle(SKETCH_11_R)
        with Locations(Location((13, 15, 0), (0, 0, 270))):
            Circle(SKETCH_11_R)
    extrude(amount=-CUT_EXTRUDE_9_DEPTH, mode=Mode.SUBTRACT)


solid = part.part
